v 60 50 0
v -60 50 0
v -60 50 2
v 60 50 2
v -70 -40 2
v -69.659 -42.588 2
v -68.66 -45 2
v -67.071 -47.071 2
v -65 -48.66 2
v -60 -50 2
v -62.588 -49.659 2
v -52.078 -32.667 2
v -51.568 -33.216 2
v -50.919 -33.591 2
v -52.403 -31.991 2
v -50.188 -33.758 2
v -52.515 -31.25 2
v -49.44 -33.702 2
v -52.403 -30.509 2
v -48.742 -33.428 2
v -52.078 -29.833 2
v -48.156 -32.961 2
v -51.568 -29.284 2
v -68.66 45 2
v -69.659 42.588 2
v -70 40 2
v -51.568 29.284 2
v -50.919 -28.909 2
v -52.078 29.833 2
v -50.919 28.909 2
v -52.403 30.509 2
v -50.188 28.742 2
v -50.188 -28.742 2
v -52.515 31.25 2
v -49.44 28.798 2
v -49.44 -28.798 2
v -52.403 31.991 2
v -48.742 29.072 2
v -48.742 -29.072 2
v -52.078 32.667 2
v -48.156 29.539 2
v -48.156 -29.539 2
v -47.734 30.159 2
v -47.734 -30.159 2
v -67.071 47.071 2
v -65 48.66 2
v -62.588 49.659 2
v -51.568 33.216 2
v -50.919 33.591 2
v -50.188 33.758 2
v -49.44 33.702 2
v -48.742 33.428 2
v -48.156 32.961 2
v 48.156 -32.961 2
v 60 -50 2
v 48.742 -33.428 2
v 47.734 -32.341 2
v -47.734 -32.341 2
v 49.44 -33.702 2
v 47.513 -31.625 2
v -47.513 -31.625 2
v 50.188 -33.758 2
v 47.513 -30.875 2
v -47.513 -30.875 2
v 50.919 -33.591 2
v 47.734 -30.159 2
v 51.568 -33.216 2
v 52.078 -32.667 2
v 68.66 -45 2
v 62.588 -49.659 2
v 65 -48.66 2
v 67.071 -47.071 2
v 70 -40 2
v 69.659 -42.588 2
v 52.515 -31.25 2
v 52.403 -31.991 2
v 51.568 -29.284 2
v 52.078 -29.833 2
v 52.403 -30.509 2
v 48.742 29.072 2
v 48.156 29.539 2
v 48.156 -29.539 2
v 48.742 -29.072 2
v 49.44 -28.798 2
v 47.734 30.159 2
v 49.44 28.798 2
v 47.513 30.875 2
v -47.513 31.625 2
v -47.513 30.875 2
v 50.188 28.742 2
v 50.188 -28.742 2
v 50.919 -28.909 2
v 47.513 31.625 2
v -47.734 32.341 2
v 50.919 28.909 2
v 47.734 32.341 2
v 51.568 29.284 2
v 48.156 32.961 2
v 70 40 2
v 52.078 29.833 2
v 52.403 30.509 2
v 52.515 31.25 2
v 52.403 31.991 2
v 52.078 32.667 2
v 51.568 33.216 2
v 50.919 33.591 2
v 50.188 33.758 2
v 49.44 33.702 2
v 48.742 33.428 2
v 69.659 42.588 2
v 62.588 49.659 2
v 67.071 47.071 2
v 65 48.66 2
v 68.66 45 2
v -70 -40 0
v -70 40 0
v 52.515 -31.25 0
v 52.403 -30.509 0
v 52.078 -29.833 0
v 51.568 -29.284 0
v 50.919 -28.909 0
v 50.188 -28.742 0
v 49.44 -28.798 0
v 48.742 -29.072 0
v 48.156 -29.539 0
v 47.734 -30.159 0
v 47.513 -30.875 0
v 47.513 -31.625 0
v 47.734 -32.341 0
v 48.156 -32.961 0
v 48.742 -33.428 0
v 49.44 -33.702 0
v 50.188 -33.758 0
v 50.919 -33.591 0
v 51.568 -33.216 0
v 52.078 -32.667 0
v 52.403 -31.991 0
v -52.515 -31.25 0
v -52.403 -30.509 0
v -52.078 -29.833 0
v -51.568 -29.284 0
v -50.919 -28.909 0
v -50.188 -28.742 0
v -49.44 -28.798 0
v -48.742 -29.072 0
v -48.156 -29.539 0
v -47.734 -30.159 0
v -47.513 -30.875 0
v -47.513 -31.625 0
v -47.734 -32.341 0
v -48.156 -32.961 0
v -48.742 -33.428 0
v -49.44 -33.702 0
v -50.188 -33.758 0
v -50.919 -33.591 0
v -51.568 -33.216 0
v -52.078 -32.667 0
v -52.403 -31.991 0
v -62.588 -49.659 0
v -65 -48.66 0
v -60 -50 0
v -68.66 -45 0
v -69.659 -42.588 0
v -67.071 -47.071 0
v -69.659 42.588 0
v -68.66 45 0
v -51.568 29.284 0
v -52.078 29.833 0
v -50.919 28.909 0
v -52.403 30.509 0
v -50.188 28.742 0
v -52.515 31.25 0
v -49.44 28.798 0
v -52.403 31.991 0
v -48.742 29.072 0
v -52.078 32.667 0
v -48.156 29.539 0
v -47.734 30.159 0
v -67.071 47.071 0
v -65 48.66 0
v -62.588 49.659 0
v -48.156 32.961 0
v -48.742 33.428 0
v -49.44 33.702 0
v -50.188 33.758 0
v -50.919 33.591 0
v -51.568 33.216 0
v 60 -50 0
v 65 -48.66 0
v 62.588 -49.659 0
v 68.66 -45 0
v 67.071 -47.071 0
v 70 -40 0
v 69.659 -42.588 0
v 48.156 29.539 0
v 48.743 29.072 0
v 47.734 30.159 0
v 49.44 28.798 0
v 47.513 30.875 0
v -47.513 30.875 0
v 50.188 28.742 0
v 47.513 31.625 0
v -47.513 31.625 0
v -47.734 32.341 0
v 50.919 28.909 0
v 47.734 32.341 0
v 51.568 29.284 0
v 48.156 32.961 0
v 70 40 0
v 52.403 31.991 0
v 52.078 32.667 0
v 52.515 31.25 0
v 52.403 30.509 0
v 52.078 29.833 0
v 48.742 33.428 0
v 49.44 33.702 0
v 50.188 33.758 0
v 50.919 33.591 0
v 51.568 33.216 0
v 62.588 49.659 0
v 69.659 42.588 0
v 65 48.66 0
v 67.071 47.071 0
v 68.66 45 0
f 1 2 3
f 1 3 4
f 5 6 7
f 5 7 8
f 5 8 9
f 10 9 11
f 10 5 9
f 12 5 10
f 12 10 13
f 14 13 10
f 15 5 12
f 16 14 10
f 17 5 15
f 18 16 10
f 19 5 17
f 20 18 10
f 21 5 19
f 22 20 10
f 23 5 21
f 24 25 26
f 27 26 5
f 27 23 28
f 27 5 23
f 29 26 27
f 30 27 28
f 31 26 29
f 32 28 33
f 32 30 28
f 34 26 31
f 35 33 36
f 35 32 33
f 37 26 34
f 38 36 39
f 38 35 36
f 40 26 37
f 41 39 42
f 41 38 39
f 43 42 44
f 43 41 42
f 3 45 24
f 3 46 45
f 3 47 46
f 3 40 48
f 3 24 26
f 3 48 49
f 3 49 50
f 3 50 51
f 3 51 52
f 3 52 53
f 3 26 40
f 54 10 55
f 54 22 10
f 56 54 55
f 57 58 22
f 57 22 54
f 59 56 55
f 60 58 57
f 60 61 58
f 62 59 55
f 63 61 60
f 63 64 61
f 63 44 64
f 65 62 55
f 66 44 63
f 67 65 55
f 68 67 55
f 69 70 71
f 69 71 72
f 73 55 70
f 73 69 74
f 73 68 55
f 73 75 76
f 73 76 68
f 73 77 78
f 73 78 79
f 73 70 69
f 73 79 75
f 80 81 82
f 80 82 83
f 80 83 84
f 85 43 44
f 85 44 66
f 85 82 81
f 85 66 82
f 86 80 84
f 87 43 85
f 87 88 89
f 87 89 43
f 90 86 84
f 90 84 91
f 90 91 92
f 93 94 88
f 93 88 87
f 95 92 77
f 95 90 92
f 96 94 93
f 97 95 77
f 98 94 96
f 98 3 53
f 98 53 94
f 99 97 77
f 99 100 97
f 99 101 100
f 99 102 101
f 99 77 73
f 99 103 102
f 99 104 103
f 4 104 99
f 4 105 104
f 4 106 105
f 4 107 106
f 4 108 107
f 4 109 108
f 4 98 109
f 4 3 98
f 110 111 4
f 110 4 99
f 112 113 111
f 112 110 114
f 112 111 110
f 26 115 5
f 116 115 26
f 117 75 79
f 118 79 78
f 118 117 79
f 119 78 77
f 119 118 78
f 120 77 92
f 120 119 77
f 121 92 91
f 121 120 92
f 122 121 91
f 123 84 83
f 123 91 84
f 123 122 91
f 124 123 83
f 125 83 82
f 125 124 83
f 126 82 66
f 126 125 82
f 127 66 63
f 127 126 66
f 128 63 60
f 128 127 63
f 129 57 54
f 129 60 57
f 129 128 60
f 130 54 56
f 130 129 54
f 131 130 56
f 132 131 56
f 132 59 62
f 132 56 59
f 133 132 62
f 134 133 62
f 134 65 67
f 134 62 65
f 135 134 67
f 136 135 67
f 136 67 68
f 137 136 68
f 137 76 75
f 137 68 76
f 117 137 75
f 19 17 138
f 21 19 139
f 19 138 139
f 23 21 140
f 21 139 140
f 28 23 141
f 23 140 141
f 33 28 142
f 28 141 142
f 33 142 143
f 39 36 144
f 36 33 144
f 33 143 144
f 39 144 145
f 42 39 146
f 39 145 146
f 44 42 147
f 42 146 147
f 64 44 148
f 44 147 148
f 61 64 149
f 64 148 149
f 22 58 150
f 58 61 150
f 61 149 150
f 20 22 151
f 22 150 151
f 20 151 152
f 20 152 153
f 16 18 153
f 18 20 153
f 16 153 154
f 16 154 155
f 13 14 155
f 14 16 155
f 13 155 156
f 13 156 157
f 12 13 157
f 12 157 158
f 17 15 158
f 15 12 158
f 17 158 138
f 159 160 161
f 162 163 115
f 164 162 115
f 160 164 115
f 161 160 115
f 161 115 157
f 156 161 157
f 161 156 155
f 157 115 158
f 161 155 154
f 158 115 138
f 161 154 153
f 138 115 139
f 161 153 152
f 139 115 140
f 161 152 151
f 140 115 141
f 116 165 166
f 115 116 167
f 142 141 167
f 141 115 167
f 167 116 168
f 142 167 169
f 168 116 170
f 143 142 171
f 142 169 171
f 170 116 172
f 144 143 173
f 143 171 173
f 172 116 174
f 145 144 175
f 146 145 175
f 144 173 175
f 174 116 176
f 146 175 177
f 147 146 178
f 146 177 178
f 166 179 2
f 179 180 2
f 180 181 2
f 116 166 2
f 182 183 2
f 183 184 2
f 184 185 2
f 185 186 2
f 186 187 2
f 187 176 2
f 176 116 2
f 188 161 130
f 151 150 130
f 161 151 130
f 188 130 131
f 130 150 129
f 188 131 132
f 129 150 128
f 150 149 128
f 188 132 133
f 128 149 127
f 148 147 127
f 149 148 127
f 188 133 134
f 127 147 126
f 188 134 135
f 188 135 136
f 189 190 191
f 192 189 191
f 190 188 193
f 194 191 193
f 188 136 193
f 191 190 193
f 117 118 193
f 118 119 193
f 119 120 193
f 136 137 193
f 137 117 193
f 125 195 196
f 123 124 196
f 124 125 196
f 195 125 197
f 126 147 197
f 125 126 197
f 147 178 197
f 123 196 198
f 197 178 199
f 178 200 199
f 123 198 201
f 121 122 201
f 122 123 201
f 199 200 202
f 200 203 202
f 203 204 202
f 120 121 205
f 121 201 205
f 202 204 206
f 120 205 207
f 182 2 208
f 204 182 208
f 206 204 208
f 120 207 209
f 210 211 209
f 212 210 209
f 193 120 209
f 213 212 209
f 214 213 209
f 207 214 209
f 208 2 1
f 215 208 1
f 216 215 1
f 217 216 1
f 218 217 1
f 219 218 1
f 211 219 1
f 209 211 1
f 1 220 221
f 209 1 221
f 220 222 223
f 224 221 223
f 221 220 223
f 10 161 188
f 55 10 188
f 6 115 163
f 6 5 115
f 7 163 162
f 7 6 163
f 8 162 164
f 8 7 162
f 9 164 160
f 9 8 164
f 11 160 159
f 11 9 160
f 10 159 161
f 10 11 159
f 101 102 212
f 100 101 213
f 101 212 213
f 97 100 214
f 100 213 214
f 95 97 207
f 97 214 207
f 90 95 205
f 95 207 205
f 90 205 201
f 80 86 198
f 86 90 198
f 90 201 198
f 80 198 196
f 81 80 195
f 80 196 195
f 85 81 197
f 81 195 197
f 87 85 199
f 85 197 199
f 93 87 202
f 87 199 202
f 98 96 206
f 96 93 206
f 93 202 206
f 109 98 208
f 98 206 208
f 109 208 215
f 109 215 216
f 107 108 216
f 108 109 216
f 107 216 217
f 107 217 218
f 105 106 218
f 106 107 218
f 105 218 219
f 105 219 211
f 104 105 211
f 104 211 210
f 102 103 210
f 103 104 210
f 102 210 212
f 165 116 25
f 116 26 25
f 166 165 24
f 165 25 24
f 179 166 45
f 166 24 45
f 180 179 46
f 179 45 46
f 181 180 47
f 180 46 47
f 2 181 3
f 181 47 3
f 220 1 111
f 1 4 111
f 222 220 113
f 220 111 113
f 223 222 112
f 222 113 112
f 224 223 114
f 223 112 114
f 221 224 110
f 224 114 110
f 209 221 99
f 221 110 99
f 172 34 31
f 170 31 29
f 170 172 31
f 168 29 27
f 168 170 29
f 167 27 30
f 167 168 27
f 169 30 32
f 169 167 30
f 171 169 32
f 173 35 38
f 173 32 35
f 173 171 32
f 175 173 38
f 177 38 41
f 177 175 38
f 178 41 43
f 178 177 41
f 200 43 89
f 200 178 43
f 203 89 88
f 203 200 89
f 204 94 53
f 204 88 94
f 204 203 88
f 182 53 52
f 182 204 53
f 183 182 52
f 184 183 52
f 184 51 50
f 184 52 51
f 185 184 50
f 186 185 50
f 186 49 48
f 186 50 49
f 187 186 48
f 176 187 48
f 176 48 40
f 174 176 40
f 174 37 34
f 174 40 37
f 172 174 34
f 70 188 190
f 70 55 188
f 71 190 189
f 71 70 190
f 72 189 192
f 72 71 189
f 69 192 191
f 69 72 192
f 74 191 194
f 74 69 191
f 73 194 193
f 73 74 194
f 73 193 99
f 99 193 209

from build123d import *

# Parameters (mm, degrees)
SKETCH1_W                                  = 140
SKETCH1_H                                  = 100
BOSS_EXTRUDE1_DEPTH                        = 2
CUT_EXTRUDE2_REACH                         = 88.046
SKETCH2_R                                  = 2.515
FILLET1_R                                  = 10
MIRROR1_AT_THE_SECOND_PLANE_COPY_1_REACH   = 88.046
MIRROR1_AT_THE_SECOND_PLANE_COPY_1_SKETC_R = 2.515


with BuildPart() as part:
    # Sketch1 → Boss-Extrude1 (new body)
    with BuildSketch(Plane.XY):
        Rectangle(SKETCH1_W, SKETCH1_H)
    extrude(amount=BOSS_EXTRUDE1_DEPTH)

    # Sketch2 → Cut-Extrude2 (cut, up to next)
    with BuildSketch(Plane.XY, mode=Mode.PRIVATE) as cut_extrude2_sk1:
        with Locations((-50, 31.25)):
            Circle(SKETCH2_R)
    cut_extrude2_tool1 = extrude(cut_extrude2_sk1.sketch, amount=CUT_EXTRUDE2_REACH, mode=Mode.PRIVATE) & part.part
    cut_extrude2 = cut_extrude2_tool1.solids().sort_by_distance((-50, 31.25, 0))[0]
    add(cut_extrude2, mode=Mode.SUBTRACT)

    # Fillet1
    fillet1_edges = [part.edges().sort_by_distance(p)[0] for p in [
        (70, -50, 1),
        (70, 50, 1),
        (-70, -50, 1),
        (-70, 50, 1),
    ]]
    fillet(fillet1_edges, radius=FILLET1_R)

    # Mirror1: Cut-Extrude2 across plane
    add(cut_extrude2.mirror(Plane.ZX), mode=Mode.SUBTRACT)

    # Mirror1 at the second plane: Cut-Extrude2 across plane
    add(cut_extrude2.mirror(Plane(origin=(0, 0, 0), x_dir=(0, 0, 1), z_dir=(1, 0, 0))), mode=Mode.SUBTRACT)

    # Mirror1 at the second plane copy 1 sketc → Mirror1 at the second plane copy 1 (cut, up to next)
    with BuildSketch(Plane(origin=(0, 0, 0), x_dir=(-1, 0, 0), z_dir=(0, 0, 1)), mode=Mode.PRIVATE) as mirror1_at_the_second_plane_copy_1_sk1:
        with Locations((-50, 31.25)):
            Circle(MIRROR1_AT_THE_SECOND_PLANE_COPY_1_SKETC_R)
    mirror1_at_the_second_plane_copy_1_tool1 = extrude(mirror1_at_the_second_plane_copy_1_sk1.sketch, amount=MIRROR1_AT_THE_SECOND_PLANE_COPY_1_REACH, mode=Mode.PRIVATE) & part.part
    add(mirror1_at_the_second_plane_copy_1_tool1.solids().sort_by_distance((50, -31.25, 0))[0], mode=Mode.SUBTRACT)


solid = part.part
